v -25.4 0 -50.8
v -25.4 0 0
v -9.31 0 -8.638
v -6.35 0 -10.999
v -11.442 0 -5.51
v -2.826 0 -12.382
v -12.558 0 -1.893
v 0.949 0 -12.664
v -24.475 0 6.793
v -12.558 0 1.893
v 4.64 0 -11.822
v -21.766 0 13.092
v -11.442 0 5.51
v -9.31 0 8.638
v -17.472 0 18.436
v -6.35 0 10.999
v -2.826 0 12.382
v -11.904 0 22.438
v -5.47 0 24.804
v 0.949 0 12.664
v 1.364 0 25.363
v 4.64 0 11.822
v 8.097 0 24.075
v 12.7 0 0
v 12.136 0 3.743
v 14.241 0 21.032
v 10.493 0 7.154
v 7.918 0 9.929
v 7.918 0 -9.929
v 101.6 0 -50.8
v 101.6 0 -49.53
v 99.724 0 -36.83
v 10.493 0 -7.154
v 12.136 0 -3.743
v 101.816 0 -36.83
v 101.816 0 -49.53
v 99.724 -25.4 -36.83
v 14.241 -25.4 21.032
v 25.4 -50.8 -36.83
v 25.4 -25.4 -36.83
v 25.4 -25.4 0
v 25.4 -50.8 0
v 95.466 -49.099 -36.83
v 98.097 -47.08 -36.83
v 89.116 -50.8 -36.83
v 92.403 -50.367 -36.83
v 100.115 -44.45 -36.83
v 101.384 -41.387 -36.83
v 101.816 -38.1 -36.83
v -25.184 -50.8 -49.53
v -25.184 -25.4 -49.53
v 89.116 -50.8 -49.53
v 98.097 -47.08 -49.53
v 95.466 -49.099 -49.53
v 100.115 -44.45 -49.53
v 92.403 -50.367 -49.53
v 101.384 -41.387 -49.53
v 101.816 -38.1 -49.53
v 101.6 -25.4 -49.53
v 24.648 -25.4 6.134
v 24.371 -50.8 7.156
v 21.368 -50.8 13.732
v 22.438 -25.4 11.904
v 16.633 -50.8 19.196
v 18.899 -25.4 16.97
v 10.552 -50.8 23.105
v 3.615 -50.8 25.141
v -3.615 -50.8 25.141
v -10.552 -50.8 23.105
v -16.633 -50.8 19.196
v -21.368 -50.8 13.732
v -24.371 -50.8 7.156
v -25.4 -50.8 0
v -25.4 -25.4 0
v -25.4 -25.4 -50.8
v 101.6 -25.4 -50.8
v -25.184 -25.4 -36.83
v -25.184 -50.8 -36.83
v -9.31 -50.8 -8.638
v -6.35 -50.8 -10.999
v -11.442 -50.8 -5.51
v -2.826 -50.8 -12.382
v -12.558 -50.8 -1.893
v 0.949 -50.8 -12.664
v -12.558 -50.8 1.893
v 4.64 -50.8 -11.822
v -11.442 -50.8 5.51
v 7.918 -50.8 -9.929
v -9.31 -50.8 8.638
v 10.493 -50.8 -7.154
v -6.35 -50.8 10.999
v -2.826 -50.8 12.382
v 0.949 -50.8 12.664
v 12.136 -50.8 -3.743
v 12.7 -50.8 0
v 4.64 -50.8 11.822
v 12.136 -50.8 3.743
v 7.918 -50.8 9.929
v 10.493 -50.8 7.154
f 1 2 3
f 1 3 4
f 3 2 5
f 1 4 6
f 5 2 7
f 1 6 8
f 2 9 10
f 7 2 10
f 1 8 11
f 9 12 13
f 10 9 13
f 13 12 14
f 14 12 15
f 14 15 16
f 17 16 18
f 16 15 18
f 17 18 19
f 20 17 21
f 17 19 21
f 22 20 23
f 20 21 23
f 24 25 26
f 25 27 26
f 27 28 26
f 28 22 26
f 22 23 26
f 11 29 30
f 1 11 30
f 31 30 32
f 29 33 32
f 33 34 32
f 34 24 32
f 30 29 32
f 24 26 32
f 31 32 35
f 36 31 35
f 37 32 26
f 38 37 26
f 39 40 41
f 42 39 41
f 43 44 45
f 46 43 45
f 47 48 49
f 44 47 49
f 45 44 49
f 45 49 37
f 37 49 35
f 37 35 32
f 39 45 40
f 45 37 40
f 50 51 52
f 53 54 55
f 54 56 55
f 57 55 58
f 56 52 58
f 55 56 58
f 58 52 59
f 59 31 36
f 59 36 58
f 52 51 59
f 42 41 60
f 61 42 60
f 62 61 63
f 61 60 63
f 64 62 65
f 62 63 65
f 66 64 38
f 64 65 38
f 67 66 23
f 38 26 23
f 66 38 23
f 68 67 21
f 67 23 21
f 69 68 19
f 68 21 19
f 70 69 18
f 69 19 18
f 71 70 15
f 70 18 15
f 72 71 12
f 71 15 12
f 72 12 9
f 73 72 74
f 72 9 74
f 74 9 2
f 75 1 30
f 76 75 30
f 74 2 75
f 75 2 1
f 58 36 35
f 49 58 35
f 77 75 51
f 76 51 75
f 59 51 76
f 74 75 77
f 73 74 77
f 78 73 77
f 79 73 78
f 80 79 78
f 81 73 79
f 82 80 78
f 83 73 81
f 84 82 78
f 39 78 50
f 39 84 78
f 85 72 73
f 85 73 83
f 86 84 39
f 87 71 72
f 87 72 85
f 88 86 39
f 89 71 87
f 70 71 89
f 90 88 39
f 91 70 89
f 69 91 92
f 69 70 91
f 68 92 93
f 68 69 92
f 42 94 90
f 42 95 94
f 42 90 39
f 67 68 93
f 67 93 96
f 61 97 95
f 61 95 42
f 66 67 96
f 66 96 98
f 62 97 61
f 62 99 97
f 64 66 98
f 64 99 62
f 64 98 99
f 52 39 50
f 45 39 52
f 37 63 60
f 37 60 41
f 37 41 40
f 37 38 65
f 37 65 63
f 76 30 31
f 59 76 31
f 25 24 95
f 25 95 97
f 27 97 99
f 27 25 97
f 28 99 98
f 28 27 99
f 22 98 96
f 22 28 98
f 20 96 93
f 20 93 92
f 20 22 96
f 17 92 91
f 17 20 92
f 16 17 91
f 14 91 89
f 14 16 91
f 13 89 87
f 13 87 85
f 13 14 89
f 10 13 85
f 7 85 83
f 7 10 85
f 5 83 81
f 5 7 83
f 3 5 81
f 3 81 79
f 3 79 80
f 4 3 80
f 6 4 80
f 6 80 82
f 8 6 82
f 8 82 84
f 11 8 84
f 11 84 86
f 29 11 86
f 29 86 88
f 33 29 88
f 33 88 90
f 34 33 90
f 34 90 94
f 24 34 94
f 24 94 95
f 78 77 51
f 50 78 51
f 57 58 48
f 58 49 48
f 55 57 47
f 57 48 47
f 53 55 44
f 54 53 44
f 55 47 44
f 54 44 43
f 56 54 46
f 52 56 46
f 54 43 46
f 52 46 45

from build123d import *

# Parameters (mm, degrees)
F0_R     = 12.7
F1_DEPTH = 25.4
F2_R     = 12.7
F3_DEPTH = 50.8
F4_R     = 12.7


with BuildPart() as f1:
    # F0 (on Front) → F1 (new body)
    with BuildSketch(Plane.XZ):
        with BuildLine():
            Line((101.6, -38.1), (14.237873, 21.034328))
            ThreePointArc((14.237873, 21.034328), (-11.906259, 22.436599), (-25.4, 0))
            Line((-25.4, 0), (-25.4, -50.8))
            Line((-25.4, -50.8), (101.6, -50.8))
            Line((101.6, -50.8), (101.6, -38.1))
        make_face()
        Circle(F0_R, mode=Mode.SUBTRACT)
    extrude(amount=F1_DEPTH)

    # F2 (on Front) → F3 (join)
    with BuildSketch(Plane.XZ):
        with BuildLine():
            Line((25.4, -36.83), (25.4, 0))
            ThreePointArc((25.4, 0), (0, 25.4), (-25.4, 0))
            Line((-25.4, 0), (-25.183568, -36.83))
            Line((-25.183568, -36.83), (-25.183568, -49.53))
            Line((-25.183568, -49.53), (101.816432, -49.53))
            Line((101.816432, -49.53), (101.816432, -36.83))
            Line((101.816432, -36.83), (25.4, -36.83))
        make_face()
        Circle(F2_R, mode=Mode.SUBTRACT)
    extrude(amount=F3_DEPTH)

    # F4
    f4_edges = [f1.edges().sort_by_distance(p)[0] for p in [
        (101.816432, -50.8, -43.18),
    ]]
    fillet(f4_edges, radius=F4_R)


solid = f1.part
